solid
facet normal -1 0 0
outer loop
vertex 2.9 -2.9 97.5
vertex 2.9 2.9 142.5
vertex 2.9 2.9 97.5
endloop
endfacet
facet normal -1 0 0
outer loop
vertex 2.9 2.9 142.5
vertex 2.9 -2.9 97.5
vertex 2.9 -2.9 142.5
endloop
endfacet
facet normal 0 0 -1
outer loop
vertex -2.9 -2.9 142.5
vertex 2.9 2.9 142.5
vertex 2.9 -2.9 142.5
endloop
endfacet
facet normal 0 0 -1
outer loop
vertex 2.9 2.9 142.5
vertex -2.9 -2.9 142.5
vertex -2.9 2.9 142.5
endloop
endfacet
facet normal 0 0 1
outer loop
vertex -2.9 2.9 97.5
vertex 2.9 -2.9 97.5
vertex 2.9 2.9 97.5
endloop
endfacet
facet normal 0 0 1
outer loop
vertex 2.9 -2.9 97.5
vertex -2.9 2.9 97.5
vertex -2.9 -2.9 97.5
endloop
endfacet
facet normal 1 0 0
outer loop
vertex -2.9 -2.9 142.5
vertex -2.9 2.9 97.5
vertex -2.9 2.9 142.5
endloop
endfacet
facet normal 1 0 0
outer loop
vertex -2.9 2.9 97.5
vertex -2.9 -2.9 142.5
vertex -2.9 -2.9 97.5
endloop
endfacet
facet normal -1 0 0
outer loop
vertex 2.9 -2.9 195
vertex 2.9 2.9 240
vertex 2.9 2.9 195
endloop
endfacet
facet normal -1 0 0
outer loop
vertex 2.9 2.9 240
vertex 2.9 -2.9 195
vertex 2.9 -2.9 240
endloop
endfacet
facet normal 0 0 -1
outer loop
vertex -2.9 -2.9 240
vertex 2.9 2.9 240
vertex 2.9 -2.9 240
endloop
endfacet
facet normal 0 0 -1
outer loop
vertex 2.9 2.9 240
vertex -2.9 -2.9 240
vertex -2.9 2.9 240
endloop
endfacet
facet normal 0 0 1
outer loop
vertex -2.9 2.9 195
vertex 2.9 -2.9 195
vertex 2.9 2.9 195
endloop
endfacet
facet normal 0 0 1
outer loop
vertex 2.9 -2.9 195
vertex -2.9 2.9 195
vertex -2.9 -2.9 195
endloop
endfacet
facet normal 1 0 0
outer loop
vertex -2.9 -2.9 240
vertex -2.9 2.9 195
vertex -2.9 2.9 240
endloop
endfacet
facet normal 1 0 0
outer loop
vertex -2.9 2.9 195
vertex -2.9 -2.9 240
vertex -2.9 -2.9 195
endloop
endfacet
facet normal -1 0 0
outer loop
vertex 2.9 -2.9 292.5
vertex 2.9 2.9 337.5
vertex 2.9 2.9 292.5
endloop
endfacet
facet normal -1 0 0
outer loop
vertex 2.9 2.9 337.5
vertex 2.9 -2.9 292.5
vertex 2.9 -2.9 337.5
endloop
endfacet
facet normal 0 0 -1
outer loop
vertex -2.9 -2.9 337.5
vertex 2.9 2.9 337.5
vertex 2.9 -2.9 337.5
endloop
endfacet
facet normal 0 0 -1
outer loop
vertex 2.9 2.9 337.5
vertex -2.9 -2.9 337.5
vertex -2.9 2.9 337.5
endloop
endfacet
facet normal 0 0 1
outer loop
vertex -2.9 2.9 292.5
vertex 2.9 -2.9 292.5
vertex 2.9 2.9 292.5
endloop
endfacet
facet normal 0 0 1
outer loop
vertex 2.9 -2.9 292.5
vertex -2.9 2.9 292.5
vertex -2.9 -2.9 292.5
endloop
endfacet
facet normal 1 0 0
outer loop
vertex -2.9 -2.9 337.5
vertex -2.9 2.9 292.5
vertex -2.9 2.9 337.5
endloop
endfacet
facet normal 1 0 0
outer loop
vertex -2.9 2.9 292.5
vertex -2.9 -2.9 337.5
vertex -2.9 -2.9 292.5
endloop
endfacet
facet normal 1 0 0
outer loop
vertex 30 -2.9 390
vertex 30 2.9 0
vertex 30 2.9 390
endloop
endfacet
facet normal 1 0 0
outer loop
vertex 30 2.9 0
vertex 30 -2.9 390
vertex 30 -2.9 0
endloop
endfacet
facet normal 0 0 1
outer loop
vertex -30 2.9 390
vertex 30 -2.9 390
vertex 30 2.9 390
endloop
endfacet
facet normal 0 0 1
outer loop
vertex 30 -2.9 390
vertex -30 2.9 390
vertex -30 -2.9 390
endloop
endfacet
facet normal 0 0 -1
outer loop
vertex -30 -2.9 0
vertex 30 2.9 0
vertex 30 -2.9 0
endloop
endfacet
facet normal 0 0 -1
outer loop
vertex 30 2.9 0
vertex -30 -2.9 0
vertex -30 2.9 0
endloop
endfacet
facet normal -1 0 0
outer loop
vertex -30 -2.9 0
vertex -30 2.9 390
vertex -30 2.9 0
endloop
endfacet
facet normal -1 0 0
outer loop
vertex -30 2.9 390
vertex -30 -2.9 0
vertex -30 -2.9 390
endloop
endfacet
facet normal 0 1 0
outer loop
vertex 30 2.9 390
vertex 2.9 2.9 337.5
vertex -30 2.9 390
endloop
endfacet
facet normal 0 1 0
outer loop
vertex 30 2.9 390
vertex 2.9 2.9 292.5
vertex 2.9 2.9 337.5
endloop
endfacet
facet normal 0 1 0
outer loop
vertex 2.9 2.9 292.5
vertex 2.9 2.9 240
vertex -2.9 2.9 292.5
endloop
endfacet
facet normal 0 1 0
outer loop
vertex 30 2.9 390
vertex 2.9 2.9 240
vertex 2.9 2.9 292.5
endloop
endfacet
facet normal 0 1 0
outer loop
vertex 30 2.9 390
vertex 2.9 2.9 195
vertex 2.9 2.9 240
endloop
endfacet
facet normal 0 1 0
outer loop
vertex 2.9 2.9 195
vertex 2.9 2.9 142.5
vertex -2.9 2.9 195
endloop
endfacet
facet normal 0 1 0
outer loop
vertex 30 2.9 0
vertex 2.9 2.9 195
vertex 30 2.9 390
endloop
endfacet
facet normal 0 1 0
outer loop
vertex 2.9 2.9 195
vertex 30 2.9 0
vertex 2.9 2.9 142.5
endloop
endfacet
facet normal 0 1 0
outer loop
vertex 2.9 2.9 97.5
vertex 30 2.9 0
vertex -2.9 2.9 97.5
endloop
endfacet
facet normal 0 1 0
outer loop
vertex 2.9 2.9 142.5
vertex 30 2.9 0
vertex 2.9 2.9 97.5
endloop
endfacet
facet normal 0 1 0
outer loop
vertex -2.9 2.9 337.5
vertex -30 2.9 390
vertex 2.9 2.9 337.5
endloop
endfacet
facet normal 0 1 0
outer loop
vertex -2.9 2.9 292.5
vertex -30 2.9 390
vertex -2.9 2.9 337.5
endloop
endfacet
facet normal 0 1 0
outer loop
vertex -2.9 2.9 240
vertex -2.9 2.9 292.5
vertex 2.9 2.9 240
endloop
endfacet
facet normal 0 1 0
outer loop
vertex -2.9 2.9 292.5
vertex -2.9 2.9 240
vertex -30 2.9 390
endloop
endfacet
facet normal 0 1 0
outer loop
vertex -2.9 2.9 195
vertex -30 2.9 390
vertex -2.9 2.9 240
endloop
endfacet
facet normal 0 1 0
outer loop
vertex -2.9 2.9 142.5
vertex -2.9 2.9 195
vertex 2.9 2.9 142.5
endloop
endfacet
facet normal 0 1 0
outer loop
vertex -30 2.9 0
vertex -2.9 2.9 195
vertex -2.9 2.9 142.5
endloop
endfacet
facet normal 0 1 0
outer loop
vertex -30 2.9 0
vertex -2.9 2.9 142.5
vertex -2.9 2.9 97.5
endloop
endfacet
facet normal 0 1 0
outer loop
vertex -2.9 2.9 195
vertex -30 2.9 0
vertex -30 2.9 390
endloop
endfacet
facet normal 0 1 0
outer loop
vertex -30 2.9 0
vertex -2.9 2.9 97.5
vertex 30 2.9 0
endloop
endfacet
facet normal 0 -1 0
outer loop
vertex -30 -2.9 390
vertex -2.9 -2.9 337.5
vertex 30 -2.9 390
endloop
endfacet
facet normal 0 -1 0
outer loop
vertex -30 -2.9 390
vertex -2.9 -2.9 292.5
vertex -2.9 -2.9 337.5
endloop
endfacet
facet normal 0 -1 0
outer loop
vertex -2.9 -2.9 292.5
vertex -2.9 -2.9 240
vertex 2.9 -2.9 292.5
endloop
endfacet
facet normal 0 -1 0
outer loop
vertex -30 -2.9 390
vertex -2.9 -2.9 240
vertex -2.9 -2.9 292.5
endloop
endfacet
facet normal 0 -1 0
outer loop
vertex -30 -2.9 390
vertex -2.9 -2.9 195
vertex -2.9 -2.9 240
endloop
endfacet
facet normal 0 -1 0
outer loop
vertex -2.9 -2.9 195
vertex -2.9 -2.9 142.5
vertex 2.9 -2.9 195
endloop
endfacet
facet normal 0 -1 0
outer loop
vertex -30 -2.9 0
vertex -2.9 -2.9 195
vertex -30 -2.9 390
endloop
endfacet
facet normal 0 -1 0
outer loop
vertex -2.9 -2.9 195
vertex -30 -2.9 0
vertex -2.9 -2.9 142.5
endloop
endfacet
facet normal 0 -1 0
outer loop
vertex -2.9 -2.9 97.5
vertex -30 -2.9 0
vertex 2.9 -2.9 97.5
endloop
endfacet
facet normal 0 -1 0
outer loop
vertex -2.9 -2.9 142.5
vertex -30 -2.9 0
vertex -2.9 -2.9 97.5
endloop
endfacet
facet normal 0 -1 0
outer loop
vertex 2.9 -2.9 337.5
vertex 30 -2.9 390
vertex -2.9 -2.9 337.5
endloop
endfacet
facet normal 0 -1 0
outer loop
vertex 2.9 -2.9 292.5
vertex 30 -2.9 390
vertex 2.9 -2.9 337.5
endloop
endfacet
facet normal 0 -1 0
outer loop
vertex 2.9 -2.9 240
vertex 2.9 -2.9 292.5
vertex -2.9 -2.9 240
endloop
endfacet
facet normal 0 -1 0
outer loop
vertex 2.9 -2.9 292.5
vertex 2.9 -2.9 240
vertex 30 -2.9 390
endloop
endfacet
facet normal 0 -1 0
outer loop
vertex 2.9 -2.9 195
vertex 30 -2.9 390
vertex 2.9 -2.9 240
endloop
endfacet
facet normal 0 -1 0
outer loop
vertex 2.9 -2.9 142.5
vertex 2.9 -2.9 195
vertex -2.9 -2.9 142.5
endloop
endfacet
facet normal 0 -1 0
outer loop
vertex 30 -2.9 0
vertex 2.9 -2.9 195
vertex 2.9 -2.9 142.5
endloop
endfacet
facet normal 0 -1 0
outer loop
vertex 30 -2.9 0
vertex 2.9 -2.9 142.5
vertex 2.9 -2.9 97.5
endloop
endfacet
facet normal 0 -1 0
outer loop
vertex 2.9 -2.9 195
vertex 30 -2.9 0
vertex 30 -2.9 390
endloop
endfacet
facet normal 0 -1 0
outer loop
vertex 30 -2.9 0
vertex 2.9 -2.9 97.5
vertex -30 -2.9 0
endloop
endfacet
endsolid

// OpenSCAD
// file: global.scad
// all measures in mm

material_x = 800;
material_y = 205;
material_width = 5.8;

leg_x = 60;
leg_y = 60;
leg_z = 390;

// about hoch much the faces in Y direction are inset
face_y_inset = 15;

// how far the joint extends planarly from the face
joint_x = 12;
// the lateral width of the joint
joint_y = 20;
// how far down the hook extends
joint_hook_y = 25;

joint_total_height = joint_y + joint_hook_y;

num_joints = 3;
q = leg_z/4;
joint_height = [q, 2*q, 3*q];

// how far apart from on another to project the parts
projection_spacing = 1;

// rendering quality (face number)
$fn = 50;
// main file
include <global.scad>;

/**
 * One of the two planes lying in XZ layer
 */
module face_x()
{
    color("red")
    difference()
    {
        // center
        translate([
            -leg_x/2,
            -material_width/2,
            0
            ])
            // basic rectangular face
            cube([
                leg_x,
                material_width,
                leg_z
                ]);

        // cut out holes for the joints
        {
            // at all the configured joint heights
            for (z = joint_height)
            {
                translate([
                    -material_width/2,
                    -material_width,
                    z
                    ])
                    cube([
                        material_width,
                        2*material_width,
                        joint_total_height
                        ]);
            }
        }
    }
}

face_x();
